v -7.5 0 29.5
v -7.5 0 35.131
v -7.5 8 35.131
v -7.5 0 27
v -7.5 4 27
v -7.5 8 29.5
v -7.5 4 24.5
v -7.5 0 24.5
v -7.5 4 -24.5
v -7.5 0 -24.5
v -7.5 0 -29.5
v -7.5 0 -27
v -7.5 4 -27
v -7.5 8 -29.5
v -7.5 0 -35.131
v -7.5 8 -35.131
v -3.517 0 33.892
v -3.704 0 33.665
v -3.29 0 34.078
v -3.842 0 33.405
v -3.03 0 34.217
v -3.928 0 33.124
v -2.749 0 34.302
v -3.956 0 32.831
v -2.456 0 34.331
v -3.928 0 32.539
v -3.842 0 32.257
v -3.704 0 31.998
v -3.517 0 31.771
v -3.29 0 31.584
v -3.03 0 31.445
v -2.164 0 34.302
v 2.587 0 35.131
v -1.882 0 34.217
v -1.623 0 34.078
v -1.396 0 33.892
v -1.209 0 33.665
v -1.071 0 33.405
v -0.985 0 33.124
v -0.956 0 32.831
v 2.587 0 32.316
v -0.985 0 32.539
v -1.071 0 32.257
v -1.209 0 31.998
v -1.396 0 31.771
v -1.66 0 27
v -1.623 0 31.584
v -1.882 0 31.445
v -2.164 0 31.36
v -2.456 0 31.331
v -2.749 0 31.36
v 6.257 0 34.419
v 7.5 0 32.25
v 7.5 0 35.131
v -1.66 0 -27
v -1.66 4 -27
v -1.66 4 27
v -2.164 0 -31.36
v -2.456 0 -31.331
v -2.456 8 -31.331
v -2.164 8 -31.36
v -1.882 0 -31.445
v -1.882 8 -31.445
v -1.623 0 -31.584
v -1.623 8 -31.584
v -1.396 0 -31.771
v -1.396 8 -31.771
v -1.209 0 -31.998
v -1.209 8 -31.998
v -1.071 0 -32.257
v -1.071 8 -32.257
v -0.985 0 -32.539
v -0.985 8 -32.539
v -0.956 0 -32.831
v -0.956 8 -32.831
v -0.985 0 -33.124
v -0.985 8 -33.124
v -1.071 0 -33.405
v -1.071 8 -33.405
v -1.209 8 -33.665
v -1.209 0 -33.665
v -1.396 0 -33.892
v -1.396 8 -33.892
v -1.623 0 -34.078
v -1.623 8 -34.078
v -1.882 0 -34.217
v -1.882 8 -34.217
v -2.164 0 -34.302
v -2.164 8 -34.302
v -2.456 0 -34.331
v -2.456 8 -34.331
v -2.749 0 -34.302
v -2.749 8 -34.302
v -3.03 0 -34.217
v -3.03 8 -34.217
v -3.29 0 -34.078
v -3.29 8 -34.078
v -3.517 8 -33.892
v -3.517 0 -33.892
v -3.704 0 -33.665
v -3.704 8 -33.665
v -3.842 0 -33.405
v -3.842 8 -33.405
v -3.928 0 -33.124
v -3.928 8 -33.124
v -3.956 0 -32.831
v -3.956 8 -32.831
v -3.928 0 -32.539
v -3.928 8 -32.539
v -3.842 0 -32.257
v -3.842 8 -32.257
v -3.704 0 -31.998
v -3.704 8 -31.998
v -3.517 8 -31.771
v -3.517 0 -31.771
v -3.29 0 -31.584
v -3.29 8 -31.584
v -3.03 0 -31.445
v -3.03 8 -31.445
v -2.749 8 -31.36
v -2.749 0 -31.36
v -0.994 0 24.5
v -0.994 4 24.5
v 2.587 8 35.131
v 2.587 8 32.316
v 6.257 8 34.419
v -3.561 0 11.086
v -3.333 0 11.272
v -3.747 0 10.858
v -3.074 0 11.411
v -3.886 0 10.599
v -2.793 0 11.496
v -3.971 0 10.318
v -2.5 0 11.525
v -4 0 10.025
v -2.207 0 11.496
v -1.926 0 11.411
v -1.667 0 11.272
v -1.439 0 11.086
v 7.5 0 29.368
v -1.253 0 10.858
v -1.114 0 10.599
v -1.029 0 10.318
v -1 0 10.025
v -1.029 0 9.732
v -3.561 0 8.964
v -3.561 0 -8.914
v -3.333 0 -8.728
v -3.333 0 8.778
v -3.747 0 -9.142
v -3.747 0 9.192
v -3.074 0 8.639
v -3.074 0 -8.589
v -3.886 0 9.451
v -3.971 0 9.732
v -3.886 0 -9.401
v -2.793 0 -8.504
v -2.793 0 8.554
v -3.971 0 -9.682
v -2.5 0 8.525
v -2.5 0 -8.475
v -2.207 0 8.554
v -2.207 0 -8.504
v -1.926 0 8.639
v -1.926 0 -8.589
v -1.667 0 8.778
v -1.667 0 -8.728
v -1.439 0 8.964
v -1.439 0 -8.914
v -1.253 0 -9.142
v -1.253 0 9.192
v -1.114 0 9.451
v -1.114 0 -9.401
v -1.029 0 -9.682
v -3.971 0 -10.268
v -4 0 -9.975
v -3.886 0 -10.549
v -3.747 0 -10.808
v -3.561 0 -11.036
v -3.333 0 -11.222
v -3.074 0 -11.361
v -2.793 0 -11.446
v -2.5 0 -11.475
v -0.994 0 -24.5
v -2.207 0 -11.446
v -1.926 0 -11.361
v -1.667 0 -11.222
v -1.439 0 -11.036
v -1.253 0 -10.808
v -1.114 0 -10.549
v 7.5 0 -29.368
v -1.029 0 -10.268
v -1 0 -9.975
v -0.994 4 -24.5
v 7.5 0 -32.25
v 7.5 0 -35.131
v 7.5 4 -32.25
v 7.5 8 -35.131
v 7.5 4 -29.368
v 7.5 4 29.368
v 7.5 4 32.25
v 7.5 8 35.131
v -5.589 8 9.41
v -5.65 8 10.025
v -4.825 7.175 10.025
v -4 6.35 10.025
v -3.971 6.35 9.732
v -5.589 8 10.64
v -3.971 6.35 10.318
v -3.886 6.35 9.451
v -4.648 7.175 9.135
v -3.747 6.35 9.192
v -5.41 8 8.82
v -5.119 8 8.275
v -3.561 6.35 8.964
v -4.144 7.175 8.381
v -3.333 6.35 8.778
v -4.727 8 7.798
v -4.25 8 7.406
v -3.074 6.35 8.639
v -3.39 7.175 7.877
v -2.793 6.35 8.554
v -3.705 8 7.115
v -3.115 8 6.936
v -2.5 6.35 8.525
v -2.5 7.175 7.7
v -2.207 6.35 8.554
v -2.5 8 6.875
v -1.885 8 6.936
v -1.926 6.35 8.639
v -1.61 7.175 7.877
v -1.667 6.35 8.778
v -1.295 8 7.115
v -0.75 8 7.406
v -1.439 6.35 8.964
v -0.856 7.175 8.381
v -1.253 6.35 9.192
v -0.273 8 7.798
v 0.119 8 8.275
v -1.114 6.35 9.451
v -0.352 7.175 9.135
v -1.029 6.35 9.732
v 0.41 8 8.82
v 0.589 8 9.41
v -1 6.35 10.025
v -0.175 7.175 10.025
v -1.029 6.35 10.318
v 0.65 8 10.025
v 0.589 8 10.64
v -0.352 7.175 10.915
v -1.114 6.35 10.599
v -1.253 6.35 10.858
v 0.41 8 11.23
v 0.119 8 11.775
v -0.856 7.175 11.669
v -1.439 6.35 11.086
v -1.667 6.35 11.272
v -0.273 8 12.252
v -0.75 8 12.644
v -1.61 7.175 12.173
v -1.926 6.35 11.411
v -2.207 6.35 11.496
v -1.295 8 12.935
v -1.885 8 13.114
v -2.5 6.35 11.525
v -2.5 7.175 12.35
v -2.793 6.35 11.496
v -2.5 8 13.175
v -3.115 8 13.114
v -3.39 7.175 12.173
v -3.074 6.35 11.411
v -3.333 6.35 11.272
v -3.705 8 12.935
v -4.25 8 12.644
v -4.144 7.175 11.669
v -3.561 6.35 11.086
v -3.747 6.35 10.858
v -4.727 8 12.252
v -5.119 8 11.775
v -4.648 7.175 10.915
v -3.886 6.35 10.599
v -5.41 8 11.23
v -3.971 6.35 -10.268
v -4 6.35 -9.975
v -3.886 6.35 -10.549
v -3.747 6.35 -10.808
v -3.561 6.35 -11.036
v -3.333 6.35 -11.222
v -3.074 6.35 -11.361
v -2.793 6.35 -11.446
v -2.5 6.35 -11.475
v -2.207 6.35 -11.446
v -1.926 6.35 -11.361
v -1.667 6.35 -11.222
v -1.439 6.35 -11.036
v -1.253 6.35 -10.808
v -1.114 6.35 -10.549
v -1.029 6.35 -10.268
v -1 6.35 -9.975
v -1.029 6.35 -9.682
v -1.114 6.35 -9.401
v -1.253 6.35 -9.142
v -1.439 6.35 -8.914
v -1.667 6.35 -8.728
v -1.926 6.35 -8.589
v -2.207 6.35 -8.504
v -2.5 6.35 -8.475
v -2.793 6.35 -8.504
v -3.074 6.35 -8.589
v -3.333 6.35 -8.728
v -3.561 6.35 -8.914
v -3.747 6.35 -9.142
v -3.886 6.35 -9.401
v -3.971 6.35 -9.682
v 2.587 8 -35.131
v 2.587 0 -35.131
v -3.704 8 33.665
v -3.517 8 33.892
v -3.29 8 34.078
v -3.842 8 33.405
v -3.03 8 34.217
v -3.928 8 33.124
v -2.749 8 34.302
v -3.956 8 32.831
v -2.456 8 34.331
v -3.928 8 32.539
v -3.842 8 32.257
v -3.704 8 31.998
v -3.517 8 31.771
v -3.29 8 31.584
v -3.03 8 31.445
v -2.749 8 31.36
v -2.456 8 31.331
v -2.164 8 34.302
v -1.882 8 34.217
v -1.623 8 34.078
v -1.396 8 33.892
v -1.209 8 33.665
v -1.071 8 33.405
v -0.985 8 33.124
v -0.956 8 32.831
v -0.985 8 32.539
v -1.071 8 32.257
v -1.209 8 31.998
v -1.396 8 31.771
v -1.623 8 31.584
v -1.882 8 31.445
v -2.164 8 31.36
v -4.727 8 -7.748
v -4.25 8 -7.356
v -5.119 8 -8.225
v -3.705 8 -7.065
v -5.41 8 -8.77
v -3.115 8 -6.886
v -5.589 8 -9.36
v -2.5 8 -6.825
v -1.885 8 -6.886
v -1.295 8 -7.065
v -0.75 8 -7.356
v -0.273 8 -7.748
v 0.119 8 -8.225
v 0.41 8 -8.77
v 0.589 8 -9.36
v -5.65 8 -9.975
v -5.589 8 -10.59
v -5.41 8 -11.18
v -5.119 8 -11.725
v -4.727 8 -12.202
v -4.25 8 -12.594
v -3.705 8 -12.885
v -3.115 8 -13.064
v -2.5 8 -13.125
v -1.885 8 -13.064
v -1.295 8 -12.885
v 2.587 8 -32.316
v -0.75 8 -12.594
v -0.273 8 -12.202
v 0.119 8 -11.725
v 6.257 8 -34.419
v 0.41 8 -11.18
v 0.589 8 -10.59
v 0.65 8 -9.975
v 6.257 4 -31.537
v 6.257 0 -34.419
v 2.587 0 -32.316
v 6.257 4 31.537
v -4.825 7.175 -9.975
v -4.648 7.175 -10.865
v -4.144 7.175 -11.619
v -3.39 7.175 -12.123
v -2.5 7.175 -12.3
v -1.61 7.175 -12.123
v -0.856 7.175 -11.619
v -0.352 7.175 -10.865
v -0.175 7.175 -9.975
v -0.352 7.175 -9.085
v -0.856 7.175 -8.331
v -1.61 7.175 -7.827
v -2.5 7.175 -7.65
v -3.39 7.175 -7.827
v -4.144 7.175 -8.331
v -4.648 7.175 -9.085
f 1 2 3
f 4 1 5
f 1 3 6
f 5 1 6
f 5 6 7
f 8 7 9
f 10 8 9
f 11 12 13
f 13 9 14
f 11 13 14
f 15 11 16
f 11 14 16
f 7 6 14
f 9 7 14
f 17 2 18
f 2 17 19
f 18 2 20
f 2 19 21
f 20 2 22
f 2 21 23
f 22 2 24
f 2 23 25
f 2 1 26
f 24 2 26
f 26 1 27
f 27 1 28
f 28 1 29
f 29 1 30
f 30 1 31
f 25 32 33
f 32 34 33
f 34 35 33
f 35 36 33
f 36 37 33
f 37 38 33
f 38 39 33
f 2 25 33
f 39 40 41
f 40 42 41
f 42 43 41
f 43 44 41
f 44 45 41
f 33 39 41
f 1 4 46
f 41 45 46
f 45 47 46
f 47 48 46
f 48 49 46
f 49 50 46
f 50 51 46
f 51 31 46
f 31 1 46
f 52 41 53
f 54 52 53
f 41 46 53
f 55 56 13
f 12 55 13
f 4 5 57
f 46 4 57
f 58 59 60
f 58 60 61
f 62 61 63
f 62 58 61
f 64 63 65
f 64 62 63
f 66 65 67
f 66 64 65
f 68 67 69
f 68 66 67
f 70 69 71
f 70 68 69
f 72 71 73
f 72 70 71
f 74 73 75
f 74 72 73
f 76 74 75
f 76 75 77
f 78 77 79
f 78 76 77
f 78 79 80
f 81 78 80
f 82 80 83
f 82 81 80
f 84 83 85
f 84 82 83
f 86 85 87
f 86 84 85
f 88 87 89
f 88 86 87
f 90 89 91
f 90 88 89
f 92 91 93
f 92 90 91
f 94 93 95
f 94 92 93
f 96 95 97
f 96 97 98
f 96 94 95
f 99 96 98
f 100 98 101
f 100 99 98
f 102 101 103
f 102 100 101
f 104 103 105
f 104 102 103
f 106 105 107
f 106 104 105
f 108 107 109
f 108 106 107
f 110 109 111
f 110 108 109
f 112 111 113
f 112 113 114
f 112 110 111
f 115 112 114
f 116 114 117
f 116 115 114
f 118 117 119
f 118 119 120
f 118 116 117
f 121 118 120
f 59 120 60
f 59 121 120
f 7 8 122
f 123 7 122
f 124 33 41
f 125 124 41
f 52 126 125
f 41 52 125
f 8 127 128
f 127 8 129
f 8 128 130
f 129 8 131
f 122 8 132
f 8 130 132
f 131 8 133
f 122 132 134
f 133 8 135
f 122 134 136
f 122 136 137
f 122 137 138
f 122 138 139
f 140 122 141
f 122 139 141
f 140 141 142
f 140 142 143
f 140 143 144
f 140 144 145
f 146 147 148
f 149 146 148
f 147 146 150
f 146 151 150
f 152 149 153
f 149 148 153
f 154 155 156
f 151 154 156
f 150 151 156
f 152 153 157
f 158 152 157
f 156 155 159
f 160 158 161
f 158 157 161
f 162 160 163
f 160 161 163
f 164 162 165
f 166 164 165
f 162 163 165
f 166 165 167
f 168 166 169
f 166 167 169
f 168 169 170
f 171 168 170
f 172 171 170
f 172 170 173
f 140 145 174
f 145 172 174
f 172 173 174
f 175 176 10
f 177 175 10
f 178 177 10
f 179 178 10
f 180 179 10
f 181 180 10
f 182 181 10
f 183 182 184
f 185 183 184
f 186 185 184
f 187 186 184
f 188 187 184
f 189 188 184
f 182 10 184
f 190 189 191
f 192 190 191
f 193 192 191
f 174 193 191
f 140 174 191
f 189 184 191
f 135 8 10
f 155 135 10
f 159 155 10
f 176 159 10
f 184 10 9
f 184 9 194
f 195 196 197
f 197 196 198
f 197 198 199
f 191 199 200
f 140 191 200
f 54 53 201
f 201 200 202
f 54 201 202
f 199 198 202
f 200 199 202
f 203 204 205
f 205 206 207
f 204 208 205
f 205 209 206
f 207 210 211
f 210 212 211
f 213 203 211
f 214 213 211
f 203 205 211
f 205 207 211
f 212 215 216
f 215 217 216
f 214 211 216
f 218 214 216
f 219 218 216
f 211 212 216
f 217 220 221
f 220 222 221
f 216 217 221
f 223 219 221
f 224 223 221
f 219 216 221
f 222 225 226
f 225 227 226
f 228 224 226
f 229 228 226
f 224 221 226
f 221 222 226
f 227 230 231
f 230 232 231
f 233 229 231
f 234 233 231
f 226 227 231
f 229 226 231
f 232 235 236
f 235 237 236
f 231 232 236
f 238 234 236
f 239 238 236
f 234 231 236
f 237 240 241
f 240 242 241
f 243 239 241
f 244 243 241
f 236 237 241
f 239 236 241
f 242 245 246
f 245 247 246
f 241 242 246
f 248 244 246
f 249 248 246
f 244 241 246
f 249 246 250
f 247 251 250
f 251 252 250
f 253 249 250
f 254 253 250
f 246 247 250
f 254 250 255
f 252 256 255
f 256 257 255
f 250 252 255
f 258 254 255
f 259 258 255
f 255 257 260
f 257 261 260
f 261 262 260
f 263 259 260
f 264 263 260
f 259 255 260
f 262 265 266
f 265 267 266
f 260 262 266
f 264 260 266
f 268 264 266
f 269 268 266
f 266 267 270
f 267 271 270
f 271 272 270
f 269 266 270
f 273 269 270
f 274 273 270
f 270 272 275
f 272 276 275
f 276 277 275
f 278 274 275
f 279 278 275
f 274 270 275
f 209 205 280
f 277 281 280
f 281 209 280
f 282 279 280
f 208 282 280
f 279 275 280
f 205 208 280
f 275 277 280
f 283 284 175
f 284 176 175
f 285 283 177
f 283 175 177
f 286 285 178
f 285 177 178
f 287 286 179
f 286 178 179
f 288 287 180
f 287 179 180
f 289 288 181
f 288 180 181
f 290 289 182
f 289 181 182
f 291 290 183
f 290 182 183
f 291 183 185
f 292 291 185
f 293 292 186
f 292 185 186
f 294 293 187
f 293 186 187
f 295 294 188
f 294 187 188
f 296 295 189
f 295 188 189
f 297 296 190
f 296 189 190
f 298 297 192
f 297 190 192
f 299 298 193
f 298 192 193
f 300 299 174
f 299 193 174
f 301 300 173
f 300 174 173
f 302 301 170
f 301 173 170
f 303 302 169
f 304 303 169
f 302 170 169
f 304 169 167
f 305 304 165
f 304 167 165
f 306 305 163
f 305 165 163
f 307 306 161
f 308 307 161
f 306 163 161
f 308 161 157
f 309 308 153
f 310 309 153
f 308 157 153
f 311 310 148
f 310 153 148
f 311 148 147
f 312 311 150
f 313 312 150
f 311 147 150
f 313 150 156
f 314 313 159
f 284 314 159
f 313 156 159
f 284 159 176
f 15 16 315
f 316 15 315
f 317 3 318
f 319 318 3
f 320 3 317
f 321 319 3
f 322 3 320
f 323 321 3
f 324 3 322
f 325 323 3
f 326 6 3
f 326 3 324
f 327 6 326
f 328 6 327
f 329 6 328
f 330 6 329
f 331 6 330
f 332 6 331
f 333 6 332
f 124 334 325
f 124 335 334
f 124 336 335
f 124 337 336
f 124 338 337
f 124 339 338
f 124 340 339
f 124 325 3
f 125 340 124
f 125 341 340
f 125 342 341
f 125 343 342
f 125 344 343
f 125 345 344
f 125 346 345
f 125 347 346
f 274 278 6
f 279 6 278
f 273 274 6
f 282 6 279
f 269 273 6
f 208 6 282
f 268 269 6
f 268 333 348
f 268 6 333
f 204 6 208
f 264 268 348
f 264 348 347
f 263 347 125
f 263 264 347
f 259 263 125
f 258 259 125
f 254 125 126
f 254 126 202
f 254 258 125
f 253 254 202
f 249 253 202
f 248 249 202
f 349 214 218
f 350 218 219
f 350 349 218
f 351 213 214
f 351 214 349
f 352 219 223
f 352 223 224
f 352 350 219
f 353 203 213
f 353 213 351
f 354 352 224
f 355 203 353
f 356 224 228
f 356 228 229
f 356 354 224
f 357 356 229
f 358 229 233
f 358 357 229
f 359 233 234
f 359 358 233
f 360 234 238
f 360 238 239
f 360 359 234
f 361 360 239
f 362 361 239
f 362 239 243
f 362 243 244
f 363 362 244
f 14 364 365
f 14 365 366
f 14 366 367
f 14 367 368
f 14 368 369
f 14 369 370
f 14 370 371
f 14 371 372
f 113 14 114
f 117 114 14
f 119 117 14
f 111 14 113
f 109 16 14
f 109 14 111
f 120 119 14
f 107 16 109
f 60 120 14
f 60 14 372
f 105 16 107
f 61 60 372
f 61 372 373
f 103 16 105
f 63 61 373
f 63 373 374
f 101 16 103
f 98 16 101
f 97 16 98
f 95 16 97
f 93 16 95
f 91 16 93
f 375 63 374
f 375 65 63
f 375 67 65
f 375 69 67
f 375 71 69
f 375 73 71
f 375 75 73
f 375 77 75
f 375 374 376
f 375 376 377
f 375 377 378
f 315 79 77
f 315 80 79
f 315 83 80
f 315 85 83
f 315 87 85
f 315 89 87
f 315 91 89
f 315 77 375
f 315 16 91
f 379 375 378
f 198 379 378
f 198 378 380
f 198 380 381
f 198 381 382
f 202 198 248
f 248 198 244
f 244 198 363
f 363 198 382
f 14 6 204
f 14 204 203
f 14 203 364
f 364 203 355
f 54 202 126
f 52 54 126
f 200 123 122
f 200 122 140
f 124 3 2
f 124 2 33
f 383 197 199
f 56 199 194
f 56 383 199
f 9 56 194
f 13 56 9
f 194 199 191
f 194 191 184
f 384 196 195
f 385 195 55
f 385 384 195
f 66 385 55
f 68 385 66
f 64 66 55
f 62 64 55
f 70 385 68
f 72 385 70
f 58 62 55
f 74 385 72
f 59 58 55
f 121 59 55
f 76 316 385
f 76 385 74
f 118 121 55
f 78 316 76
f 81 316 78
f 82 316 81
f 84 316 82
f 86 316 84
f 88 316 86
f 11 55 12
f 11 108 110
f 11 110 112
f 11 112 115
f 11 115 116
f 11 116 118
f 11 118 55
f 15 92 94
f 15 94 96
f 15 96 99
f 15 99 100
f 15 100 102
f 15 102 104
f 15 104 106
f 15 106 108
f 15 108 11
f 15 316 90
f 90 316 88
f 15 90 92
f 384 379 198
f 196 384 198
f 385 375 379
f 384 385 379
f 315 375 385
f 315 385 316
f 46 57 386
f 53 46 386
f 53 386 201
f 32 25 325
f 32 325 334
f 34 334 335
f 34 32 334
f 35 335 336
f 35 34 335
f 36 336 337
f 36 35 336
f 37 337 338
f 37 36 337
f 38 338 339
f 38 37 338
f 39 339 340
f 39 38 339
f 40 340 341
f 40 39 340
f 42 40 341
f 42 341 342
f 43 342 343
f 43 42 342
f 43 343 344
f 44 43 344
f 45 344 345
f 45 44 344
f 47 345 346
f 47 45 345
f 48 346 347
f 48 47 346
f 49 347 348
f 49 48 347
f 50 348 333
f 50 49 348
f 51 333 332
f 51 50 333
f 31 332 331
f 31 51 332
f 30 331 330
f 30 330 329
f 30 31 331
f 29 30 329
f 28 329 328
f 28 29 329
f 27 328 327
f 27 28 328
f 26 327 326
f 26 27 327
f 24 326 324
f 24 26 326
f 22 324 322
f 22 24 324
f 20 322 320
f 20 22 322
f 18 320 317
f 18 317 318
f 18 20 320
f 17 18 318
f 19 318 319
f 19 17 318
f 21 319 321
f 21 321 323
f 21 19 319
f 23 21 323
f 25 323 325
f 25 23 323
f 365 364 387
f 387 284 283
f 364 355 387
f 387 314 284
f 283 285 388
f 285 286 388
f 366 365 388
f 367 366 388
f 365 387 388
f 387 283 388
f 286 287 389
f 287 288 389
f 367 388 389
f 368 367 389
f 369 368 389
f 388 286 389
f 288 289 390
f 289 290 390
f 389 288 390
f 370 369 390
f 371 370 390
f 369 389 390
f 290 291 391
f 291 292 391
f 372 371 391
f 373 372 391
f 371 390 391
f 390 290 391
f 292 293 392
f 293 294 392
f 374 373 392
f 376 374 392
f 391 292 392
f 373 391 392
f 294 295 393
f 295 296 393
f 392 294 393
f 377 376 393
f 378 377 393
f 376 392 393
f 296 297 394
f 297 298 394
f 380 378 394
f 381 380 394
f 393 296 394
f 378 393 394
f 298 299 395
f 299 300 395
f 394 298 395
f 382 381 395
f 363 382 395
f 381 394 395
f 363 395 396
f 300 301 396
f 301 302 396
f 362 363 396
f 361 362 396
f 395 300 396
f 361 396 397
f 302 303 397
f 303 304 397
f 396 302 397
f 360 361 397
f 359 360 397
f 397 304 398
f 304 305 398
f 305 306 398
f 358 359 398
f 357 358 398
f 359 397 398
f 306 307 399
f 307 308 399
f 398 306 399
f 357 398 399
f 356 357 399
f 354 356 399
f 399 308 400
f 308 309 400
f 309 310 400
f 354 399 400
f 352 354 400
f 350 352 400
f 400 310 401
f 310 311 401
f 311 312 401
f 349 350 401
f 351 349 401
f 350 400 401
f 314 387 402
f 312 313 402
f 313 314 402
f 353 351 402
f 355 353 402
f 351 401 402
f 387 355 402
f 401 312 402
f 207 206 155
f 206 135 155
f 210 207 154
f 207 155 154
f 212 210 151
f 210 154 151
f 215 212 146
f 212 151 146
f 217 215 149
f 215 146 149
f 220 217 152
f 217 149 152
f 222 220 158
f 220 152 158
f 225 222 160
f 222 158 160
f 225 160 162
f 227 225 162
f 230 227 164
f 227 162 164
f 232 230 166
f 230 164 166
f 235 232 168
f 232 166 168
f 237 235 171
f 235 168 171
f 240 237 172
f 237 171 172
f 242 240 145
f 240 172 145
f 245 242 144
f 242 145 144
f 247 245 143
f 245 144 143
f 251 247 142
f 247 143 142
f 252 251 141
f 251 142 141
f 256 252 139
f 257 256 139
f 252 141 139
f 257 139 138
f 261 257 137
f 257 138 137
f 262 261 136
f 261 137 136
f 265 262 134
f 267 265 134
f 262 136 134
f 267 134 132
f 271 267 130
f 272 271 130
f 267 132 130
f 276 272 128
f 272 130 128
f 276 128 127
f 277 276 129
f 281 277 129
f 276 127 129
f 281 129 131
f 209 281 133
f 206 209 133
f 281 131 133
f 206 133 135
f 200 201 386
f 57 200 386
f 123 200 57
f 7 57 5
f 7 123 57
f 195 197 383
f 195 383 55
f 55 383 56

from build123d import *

# Parameters (mm, degrees)
SKETCH1_W                     = 15
SKETCH1_H                     = 49
BOSS_EXTRUDE1_DEPTH           = 8
CSK_FOR_M3_SFHCS1_D           = 3
CSK_FOR_M3_SFHCS1_CSINK_D     = 6.3
CSK_FOR_M3_SFHCS1_CSINK_ANGLE = 90
BOSS_EXTRUDE2_DEPTH           = 8
BOSS_EXTRUDE3_DEPTH           = 4
BOSS_EXTRUDE4_DEPTH           = 8
SKETCH8_W                     = 10.087191575
SKETCH8_H                     = 5.631262012
BOSS_EXTRUDE5_DEPTH           = 8
CUT_EXTRUDE1_START            = -8
SKETCH9_R                     = 1.5
CUT_EXTRUDE1_DEPTH            = 8


with BuildPart() as part:
    # Sketch1 → Boss-Extrude1 (new body)
    with BuildSketch(Plane(origin=(0, 0, 0), x_dir=(1, 0, 0), z_dir=(0, 1, 0))):
        Rectangle(SKETCH1_W, SKETCH1_H)
    extrude(amount=BOSS_EXTRUDE1_DEPTH)

    # CSK for M3 SFHCS1 (through all)
    with Locations(Plane(origin=(0, 8, 0), x_dir=(1, 0, 0), z_dir=(0, 1, 0))):
        with Locations((-2.499999911, -10.025), (-2.499999911, 9.975)):
            CounterSinkHole(CSK_FOR_M3_SFHCS1_D / 2, CSK_FOR_M3_SFHCS1_CSINK_D / 2, counter_sink_angle=CSK_FOR_M3_SFHCS1_CSINK_ANGLE)

    # Sketch5 → Boss-Extrude2 (add)
    with BuildSketch(Plane(origin=(0, 8, 0), x_dir=(1, 0, 0), z_dir=(0, 1, 0))):
        Polygon((-0.994383151, -24.5), (7.5, -29.368304747), (7.5, -24.5), align=None)
        Polygon((-0.994383151, 24.5), (7.5, 24.5), (7.5, 29.368304747), align=None)
    extrude(amount=-BOSS_EXTRUDE2_DEPTH)

    # Sketch6 → Boss-Extrude3 (add)
    with BuildSketch(Plane(origin=(0, 8, 0), x_dir=(1, 0, 0), z_dir=(0, 1, 0))):
        Polygon((7.5, 29.368304747), (-0.994383151, 24.5), (-7.5, 24.5), (-7.5, 27), (-1.66, 27), (6.256887241, 31.537330028), (7.5, 32.249783379), align=None)
        Polygon((-7.5, -24.5), (-0.994383151, -24.5), (7.5, -29.368304747), (7.5, -32.249783379), (6.256887241, -31.537330028), (-1.66, -27), (-7.5, -27), align=None)
    extrude(amount=-BOSS_EXTRUDE3_DEPTH)

    # Sketch7 → Boss-Extrude4 (add)
    with BuildSketch(Plane(origin=(0, 8, 0), x_dir=(1, 0, 0), z_dir=(0, 1, 0))):
        Polygon((-1.66, -27), (7.5, -32.249783379), (7.5, -35.131262012), (6.256887241, -34.41880866), (-2.325616849, -29.5), (-7.5, -29.5), (-7.5, -27), align=None)
        Polygon((7.5, 32.249783379), (-1.66, 27), (-7.5, 27), (-7.5, 29.5), (-2.325616849, 29.5), (6.256887241, 34.41880866), (7.5, 35.131262012), align=None)
    extrude(amount=-BOSS_EXTRUDE4_DEPTH)

    # Sketch8 → Boss-Extrude5 (add)
    with BuildSketch(Plane(origin=(0, 8, 0), x_dir=(1, 0, 0), z_dir=(0, 1, 0))):
        with Locations((-2.456404213, -32.315631006)):
            Rectangle(SKETCH8_W, SKETCH8_H)
        with Locations((-2.456404213, 32.315631006)):
            Rectangle(SKETCH8_W, SKETCH8_H)
    extrude(amount=-BOSS_EXTRUDE5_DEPTH)

    # Sketch9 → Cut-Extrude1 (cut)
    with BuildSketch(Plane(origin=(0, 8, 0), x_dir=(1, 0, 0), z_dir=(0, 1, 0)).offset(CUT_EXTRUDE1_START)):
        with Locations(Location((-2.456404212, 32.831262012, 0), (0, 0, 270))):
            Circle(SKETCH9_R)
        with Locations(Location((-2.456404212, -32.831262012, 0), (0, 0, 270))):
            Circle(SKETCH9_R)
    extrude(amount=CUT_EXTRUDE1_DEPTH, mode=Mode.SUBTRACT)


solid = part.part
